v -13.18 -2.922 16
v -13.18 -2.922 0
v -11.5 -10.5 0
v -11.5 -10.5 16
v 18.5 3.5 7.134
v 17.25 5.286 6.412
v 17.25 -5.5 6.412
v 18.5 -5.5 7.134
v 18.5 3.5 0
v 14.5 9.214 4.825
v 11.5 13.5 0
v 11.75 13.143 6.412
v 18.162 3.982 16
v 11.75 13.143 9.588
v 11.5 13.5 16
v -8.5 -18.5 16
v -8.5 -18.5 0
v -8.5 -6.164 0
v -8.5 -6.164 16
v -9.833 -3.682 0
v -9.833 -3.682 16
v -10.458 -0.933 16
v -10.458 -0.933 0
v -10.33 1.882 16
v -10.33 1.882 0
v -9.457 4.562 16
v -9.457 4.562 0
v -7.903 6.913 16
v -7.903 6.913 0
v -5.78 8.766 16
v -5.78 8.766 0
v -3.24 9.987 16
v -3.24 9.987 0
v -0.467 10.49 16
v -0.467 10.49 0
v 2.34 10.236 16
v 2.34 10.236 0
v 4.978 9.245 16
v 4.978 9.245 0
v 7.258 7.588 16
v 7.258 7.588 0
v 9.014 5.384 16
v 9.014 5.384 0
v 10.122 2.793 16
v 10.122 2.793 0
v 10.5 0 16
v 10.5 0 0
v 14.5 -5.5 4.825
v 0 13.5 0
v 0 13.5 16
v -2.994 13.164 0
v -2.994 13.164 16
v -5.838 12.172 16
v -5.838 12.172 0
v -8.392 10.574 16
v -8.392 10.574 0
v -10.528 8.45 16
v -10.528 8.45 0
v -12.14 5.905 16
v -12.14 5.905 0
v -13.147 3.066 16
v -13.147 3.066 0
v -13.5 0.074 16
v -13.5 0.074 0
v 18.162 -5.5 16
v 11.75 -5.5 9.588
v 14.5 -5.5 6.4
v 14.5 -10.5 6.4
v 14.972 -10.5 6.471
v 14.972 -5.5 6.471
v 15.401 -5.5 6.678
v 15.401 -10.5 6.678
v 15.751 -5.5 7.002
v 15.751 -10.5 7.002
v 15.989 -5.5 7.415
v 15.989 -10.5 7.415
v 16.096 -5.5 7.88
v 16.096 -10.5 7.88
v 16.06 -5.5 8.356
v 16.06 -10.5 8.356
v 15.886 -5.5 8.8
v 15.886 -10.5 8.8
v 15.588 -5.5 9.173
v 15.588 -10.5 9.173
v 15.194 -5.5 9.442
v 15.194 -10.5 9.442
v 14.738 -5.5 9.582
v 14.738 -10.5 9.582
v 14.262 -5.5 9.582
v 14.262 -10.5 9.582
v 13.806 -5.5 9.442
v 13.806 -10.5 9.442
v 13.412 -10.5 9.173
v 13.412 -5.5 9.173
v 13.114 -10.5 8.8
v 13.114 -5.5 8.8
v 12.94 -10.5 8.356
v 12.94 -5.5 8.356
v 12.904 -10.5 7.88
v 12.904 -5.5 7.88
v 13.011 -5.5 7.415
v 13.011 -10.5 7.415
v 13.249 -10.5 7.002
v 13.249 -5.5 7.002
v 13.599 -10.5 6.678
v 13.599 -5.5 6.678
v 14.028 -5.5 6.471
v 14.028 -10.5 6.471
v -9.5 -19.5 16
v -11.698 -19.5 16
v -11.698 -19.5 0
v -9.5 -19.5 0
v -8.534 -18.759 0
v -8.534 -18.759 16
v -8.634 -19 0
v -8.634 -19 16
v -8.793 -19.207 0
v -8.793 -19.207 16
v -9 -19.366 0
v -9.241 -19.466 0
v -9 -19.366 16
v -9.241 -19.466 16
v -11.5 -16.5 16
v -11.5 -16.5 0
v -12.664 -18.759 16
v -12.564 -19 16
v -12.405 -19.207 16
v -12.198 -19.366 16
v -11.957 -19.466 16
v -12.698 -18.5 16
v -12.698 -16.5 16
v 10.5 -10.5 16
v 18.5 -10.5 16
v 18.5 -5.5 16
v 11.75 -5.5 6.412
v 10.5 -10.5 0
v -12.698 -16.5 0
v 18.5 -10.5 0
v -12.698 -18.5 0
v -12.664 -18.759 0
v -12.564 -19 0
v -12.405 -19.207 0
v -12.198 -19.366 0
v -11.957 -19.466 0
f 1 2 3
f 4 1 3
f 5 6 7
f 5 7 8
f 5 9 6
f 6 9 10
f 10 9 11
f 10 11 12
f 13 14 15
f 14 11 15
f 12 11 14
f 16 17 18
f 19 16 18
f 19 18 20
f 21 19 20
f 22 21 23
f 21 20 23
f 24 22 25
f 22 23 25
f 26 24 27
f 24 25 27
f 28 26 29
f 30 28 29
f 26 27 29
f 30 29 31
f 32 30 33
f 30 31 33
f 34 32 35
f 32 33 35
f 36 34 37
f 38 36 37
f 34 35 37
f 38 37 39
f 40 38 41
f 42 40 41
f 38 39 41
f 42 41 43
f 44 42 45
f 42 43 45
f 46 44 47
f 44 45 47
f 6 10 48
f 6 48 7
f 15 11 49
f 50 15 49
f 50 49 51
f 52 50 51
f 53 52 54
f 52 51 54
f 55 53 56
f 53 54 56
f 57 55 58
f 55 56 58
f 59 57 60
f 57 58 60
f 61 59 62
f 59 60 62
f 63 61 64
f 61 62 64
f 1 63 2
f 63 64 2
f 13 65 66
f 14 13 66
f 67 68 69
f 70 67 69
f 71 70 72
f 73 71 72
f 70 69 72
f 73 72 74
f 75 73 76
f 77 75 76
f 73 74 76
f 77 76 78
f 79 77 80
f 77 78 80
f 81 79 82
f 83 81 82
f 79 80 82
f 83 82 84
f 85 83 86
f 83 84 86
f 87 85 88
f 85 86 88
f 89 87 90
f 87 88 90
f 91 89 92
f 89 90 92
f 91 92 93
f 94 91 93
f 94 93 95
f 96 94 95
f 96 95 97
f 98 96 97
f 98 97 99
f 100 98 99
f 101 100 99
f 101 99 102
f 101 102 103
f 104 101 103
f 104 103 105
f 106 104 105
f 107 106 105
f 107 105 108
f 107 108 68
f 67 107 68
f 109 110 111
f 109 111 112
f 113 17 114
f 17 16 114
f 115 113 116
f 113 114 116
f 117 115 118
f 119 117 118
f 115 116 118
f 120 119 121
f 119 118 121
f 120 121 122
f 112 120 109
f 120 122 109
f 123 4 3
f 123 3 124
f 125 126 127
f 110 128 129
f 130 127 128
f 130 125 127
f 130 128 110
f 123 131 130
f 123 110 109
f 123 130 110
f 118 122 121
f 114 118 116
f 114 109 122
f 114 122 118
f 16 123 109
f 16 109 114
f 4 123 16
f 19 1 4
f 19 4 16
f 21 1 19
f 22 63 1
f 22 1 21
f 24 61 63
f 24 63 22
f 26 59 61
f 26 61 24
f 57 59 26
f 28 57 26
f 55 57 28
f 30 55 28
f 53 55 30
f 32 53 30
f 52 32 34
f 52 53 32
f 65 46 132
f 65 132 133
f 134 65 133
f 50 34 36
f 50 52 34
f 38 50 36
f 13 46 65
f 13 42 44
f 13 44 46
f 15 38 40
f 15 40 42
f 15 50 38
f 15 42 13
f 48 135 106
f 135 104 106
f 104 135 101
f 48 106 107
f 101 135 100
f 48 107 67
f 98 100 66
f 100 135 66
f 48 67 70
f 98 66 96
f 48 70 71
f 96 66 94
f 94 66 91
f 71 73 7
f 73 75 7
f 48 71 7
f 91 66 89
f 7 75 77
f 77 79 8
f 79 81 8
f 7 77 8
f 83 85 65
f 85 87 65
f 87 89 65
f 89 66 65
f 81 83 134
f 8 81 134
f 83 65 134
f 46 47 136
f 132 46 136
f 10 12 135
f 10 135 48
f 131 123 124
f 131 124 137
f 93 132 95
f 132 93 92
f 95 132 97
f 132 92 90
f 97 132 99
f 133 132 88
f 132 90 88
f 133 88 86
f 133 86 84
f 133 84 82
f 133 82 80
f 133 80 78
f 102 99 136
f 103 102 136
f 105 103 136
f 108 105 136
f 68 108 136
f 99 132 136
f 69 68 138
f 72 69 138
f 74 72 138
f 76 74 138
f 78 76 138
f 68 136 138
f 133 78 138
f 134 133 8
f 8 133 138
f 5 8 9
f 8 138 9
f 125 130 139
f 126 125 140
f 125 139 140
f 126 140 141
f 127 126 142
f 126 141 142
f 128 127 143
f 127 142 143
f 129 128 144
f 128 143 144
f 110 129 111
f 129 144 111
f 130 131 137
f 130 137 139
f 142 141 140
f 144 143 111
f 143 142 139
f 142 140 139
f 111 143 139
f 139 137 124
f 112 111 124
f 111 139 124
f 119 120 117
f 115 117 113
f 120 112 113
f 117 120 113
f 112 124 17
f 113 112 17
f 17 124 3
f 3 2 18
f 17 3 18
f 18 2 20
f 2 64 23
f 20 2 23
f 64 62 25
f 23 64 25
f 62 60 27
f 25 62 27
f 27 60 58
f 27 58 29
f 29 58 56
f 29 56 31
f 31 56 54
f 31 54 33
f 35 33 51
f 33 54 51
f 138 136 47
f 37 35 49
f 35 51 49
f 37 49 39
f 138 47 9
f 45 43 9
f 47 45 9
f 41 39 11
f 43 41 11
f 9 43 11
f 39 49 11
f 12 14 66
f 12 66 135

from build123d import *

# Parameters (mm, degrees)
BOSS_EXTRUDE1_DEPTH = 16
CHAMFER1_SIZE       = 10
CHAMFER1_SIZE2      = 7
SKETCH2_R           = 1.6
CUT_EXTRUDE1_DEPTH  = 35.267331381
CUT_EXTRUDE2_START  = -5
CUT_EXTRUDE2_DEPTH  = 30.267331381
FILLET1_R           = 1


with BuildPart() as part:
    # Sketch1 → Boss-Extrude1 (new body)
    with BuildSketch(Plane.XY):
        with BuildLine():
            Line((10.5, 0), (10.5, -10.5))
            Line((10.5, -10.5), (18.5, -10.5))
            Line((18.5, -10.5), (18.5, 13.5))
            Line((18.5, 13.5), (0, 13.5))
            ThreePointArc((0, 13.5), (-10.52842962, 8.449980458), (-13.180003635, -2.92190078))
            Line((-13.180003635, -2.92190078), (-11.5, -10.5))
            Line((-11.5, -10.5), (-11.5, -16.5))
            Line((-11.5, -16.5), (-12.697755895, -16.5))
            Line((-12.697755895, -16.5), (-12.697755895, -18.5))
            ThreePointArc((-12.697755895, -18.5), (-12.404862676, -19.207106781), (-11.697755895, -19.5))
            Line((-11.697755895, -19.5), (-8.5, -19.5))
            Line((-8.5, -19.5), (-8.5, -6.164414003))
            ThreePointArc((-8.5, -6.164414003), (-3.240370349, 9.987492178), (10.5, 0))
        make_face()
    extrude(amount=BOSS_EXTRUDE1_DEPTH)

    # Chamfer1
    chamfer1_edges = [part.edges().sort_by_distance(p)[0] for p in [
        (18.5, 13.5, 8),
    ]]
    chamfer1_side = [part.faces().sort_by_distance(p)[0] for p in [
        (18.5, 1.5, 8),
    ]]
    chamfer(chamfer1_edges, length=CHAMFER1_SIZE, length2=CHAMFER1_SIZE2, reference=chamfer1_side[0])

    # Sketch2 → Cut-Extrude1 (cut, through all)
    with BuildSketch(Plane.XZ.offset(10.5)):
        with Locations(Location((14.5, 8, 0), (0, 0, 270))):
            Circle(SKETCH2_R)
    extrude(amount=-CUT_EXTRUDE1_DEPTH, mode=Mode.SUBTRACT)

    # Sketch3 → Cut-Extrude2 (cut, through all)
    with BuildSketch(Plane.XZ.offset(10.5).offset(CUT_EXTRUDE2_START)):
        Polygon((17.25, 6.41228676), (19.609136336, 7.774334758), (19.609136336, 17.446849576), (11.75, 9.58771324), (11.75, 6.41228676), (14.5, 4.824573519), align=None)
    extrude(amount=-CUT_EXTRUDE2_DEPTH, mode=Mode.SUBTRACT)

    # Fillet1
    fillet1_edges = [part.edges().sort_by_distance(p)[0] for p in [
        (-8.5, -19.5, 8),
    ]]
    fillet(fillet1_edges, radius=FILLET1_R)


solid = part.part
